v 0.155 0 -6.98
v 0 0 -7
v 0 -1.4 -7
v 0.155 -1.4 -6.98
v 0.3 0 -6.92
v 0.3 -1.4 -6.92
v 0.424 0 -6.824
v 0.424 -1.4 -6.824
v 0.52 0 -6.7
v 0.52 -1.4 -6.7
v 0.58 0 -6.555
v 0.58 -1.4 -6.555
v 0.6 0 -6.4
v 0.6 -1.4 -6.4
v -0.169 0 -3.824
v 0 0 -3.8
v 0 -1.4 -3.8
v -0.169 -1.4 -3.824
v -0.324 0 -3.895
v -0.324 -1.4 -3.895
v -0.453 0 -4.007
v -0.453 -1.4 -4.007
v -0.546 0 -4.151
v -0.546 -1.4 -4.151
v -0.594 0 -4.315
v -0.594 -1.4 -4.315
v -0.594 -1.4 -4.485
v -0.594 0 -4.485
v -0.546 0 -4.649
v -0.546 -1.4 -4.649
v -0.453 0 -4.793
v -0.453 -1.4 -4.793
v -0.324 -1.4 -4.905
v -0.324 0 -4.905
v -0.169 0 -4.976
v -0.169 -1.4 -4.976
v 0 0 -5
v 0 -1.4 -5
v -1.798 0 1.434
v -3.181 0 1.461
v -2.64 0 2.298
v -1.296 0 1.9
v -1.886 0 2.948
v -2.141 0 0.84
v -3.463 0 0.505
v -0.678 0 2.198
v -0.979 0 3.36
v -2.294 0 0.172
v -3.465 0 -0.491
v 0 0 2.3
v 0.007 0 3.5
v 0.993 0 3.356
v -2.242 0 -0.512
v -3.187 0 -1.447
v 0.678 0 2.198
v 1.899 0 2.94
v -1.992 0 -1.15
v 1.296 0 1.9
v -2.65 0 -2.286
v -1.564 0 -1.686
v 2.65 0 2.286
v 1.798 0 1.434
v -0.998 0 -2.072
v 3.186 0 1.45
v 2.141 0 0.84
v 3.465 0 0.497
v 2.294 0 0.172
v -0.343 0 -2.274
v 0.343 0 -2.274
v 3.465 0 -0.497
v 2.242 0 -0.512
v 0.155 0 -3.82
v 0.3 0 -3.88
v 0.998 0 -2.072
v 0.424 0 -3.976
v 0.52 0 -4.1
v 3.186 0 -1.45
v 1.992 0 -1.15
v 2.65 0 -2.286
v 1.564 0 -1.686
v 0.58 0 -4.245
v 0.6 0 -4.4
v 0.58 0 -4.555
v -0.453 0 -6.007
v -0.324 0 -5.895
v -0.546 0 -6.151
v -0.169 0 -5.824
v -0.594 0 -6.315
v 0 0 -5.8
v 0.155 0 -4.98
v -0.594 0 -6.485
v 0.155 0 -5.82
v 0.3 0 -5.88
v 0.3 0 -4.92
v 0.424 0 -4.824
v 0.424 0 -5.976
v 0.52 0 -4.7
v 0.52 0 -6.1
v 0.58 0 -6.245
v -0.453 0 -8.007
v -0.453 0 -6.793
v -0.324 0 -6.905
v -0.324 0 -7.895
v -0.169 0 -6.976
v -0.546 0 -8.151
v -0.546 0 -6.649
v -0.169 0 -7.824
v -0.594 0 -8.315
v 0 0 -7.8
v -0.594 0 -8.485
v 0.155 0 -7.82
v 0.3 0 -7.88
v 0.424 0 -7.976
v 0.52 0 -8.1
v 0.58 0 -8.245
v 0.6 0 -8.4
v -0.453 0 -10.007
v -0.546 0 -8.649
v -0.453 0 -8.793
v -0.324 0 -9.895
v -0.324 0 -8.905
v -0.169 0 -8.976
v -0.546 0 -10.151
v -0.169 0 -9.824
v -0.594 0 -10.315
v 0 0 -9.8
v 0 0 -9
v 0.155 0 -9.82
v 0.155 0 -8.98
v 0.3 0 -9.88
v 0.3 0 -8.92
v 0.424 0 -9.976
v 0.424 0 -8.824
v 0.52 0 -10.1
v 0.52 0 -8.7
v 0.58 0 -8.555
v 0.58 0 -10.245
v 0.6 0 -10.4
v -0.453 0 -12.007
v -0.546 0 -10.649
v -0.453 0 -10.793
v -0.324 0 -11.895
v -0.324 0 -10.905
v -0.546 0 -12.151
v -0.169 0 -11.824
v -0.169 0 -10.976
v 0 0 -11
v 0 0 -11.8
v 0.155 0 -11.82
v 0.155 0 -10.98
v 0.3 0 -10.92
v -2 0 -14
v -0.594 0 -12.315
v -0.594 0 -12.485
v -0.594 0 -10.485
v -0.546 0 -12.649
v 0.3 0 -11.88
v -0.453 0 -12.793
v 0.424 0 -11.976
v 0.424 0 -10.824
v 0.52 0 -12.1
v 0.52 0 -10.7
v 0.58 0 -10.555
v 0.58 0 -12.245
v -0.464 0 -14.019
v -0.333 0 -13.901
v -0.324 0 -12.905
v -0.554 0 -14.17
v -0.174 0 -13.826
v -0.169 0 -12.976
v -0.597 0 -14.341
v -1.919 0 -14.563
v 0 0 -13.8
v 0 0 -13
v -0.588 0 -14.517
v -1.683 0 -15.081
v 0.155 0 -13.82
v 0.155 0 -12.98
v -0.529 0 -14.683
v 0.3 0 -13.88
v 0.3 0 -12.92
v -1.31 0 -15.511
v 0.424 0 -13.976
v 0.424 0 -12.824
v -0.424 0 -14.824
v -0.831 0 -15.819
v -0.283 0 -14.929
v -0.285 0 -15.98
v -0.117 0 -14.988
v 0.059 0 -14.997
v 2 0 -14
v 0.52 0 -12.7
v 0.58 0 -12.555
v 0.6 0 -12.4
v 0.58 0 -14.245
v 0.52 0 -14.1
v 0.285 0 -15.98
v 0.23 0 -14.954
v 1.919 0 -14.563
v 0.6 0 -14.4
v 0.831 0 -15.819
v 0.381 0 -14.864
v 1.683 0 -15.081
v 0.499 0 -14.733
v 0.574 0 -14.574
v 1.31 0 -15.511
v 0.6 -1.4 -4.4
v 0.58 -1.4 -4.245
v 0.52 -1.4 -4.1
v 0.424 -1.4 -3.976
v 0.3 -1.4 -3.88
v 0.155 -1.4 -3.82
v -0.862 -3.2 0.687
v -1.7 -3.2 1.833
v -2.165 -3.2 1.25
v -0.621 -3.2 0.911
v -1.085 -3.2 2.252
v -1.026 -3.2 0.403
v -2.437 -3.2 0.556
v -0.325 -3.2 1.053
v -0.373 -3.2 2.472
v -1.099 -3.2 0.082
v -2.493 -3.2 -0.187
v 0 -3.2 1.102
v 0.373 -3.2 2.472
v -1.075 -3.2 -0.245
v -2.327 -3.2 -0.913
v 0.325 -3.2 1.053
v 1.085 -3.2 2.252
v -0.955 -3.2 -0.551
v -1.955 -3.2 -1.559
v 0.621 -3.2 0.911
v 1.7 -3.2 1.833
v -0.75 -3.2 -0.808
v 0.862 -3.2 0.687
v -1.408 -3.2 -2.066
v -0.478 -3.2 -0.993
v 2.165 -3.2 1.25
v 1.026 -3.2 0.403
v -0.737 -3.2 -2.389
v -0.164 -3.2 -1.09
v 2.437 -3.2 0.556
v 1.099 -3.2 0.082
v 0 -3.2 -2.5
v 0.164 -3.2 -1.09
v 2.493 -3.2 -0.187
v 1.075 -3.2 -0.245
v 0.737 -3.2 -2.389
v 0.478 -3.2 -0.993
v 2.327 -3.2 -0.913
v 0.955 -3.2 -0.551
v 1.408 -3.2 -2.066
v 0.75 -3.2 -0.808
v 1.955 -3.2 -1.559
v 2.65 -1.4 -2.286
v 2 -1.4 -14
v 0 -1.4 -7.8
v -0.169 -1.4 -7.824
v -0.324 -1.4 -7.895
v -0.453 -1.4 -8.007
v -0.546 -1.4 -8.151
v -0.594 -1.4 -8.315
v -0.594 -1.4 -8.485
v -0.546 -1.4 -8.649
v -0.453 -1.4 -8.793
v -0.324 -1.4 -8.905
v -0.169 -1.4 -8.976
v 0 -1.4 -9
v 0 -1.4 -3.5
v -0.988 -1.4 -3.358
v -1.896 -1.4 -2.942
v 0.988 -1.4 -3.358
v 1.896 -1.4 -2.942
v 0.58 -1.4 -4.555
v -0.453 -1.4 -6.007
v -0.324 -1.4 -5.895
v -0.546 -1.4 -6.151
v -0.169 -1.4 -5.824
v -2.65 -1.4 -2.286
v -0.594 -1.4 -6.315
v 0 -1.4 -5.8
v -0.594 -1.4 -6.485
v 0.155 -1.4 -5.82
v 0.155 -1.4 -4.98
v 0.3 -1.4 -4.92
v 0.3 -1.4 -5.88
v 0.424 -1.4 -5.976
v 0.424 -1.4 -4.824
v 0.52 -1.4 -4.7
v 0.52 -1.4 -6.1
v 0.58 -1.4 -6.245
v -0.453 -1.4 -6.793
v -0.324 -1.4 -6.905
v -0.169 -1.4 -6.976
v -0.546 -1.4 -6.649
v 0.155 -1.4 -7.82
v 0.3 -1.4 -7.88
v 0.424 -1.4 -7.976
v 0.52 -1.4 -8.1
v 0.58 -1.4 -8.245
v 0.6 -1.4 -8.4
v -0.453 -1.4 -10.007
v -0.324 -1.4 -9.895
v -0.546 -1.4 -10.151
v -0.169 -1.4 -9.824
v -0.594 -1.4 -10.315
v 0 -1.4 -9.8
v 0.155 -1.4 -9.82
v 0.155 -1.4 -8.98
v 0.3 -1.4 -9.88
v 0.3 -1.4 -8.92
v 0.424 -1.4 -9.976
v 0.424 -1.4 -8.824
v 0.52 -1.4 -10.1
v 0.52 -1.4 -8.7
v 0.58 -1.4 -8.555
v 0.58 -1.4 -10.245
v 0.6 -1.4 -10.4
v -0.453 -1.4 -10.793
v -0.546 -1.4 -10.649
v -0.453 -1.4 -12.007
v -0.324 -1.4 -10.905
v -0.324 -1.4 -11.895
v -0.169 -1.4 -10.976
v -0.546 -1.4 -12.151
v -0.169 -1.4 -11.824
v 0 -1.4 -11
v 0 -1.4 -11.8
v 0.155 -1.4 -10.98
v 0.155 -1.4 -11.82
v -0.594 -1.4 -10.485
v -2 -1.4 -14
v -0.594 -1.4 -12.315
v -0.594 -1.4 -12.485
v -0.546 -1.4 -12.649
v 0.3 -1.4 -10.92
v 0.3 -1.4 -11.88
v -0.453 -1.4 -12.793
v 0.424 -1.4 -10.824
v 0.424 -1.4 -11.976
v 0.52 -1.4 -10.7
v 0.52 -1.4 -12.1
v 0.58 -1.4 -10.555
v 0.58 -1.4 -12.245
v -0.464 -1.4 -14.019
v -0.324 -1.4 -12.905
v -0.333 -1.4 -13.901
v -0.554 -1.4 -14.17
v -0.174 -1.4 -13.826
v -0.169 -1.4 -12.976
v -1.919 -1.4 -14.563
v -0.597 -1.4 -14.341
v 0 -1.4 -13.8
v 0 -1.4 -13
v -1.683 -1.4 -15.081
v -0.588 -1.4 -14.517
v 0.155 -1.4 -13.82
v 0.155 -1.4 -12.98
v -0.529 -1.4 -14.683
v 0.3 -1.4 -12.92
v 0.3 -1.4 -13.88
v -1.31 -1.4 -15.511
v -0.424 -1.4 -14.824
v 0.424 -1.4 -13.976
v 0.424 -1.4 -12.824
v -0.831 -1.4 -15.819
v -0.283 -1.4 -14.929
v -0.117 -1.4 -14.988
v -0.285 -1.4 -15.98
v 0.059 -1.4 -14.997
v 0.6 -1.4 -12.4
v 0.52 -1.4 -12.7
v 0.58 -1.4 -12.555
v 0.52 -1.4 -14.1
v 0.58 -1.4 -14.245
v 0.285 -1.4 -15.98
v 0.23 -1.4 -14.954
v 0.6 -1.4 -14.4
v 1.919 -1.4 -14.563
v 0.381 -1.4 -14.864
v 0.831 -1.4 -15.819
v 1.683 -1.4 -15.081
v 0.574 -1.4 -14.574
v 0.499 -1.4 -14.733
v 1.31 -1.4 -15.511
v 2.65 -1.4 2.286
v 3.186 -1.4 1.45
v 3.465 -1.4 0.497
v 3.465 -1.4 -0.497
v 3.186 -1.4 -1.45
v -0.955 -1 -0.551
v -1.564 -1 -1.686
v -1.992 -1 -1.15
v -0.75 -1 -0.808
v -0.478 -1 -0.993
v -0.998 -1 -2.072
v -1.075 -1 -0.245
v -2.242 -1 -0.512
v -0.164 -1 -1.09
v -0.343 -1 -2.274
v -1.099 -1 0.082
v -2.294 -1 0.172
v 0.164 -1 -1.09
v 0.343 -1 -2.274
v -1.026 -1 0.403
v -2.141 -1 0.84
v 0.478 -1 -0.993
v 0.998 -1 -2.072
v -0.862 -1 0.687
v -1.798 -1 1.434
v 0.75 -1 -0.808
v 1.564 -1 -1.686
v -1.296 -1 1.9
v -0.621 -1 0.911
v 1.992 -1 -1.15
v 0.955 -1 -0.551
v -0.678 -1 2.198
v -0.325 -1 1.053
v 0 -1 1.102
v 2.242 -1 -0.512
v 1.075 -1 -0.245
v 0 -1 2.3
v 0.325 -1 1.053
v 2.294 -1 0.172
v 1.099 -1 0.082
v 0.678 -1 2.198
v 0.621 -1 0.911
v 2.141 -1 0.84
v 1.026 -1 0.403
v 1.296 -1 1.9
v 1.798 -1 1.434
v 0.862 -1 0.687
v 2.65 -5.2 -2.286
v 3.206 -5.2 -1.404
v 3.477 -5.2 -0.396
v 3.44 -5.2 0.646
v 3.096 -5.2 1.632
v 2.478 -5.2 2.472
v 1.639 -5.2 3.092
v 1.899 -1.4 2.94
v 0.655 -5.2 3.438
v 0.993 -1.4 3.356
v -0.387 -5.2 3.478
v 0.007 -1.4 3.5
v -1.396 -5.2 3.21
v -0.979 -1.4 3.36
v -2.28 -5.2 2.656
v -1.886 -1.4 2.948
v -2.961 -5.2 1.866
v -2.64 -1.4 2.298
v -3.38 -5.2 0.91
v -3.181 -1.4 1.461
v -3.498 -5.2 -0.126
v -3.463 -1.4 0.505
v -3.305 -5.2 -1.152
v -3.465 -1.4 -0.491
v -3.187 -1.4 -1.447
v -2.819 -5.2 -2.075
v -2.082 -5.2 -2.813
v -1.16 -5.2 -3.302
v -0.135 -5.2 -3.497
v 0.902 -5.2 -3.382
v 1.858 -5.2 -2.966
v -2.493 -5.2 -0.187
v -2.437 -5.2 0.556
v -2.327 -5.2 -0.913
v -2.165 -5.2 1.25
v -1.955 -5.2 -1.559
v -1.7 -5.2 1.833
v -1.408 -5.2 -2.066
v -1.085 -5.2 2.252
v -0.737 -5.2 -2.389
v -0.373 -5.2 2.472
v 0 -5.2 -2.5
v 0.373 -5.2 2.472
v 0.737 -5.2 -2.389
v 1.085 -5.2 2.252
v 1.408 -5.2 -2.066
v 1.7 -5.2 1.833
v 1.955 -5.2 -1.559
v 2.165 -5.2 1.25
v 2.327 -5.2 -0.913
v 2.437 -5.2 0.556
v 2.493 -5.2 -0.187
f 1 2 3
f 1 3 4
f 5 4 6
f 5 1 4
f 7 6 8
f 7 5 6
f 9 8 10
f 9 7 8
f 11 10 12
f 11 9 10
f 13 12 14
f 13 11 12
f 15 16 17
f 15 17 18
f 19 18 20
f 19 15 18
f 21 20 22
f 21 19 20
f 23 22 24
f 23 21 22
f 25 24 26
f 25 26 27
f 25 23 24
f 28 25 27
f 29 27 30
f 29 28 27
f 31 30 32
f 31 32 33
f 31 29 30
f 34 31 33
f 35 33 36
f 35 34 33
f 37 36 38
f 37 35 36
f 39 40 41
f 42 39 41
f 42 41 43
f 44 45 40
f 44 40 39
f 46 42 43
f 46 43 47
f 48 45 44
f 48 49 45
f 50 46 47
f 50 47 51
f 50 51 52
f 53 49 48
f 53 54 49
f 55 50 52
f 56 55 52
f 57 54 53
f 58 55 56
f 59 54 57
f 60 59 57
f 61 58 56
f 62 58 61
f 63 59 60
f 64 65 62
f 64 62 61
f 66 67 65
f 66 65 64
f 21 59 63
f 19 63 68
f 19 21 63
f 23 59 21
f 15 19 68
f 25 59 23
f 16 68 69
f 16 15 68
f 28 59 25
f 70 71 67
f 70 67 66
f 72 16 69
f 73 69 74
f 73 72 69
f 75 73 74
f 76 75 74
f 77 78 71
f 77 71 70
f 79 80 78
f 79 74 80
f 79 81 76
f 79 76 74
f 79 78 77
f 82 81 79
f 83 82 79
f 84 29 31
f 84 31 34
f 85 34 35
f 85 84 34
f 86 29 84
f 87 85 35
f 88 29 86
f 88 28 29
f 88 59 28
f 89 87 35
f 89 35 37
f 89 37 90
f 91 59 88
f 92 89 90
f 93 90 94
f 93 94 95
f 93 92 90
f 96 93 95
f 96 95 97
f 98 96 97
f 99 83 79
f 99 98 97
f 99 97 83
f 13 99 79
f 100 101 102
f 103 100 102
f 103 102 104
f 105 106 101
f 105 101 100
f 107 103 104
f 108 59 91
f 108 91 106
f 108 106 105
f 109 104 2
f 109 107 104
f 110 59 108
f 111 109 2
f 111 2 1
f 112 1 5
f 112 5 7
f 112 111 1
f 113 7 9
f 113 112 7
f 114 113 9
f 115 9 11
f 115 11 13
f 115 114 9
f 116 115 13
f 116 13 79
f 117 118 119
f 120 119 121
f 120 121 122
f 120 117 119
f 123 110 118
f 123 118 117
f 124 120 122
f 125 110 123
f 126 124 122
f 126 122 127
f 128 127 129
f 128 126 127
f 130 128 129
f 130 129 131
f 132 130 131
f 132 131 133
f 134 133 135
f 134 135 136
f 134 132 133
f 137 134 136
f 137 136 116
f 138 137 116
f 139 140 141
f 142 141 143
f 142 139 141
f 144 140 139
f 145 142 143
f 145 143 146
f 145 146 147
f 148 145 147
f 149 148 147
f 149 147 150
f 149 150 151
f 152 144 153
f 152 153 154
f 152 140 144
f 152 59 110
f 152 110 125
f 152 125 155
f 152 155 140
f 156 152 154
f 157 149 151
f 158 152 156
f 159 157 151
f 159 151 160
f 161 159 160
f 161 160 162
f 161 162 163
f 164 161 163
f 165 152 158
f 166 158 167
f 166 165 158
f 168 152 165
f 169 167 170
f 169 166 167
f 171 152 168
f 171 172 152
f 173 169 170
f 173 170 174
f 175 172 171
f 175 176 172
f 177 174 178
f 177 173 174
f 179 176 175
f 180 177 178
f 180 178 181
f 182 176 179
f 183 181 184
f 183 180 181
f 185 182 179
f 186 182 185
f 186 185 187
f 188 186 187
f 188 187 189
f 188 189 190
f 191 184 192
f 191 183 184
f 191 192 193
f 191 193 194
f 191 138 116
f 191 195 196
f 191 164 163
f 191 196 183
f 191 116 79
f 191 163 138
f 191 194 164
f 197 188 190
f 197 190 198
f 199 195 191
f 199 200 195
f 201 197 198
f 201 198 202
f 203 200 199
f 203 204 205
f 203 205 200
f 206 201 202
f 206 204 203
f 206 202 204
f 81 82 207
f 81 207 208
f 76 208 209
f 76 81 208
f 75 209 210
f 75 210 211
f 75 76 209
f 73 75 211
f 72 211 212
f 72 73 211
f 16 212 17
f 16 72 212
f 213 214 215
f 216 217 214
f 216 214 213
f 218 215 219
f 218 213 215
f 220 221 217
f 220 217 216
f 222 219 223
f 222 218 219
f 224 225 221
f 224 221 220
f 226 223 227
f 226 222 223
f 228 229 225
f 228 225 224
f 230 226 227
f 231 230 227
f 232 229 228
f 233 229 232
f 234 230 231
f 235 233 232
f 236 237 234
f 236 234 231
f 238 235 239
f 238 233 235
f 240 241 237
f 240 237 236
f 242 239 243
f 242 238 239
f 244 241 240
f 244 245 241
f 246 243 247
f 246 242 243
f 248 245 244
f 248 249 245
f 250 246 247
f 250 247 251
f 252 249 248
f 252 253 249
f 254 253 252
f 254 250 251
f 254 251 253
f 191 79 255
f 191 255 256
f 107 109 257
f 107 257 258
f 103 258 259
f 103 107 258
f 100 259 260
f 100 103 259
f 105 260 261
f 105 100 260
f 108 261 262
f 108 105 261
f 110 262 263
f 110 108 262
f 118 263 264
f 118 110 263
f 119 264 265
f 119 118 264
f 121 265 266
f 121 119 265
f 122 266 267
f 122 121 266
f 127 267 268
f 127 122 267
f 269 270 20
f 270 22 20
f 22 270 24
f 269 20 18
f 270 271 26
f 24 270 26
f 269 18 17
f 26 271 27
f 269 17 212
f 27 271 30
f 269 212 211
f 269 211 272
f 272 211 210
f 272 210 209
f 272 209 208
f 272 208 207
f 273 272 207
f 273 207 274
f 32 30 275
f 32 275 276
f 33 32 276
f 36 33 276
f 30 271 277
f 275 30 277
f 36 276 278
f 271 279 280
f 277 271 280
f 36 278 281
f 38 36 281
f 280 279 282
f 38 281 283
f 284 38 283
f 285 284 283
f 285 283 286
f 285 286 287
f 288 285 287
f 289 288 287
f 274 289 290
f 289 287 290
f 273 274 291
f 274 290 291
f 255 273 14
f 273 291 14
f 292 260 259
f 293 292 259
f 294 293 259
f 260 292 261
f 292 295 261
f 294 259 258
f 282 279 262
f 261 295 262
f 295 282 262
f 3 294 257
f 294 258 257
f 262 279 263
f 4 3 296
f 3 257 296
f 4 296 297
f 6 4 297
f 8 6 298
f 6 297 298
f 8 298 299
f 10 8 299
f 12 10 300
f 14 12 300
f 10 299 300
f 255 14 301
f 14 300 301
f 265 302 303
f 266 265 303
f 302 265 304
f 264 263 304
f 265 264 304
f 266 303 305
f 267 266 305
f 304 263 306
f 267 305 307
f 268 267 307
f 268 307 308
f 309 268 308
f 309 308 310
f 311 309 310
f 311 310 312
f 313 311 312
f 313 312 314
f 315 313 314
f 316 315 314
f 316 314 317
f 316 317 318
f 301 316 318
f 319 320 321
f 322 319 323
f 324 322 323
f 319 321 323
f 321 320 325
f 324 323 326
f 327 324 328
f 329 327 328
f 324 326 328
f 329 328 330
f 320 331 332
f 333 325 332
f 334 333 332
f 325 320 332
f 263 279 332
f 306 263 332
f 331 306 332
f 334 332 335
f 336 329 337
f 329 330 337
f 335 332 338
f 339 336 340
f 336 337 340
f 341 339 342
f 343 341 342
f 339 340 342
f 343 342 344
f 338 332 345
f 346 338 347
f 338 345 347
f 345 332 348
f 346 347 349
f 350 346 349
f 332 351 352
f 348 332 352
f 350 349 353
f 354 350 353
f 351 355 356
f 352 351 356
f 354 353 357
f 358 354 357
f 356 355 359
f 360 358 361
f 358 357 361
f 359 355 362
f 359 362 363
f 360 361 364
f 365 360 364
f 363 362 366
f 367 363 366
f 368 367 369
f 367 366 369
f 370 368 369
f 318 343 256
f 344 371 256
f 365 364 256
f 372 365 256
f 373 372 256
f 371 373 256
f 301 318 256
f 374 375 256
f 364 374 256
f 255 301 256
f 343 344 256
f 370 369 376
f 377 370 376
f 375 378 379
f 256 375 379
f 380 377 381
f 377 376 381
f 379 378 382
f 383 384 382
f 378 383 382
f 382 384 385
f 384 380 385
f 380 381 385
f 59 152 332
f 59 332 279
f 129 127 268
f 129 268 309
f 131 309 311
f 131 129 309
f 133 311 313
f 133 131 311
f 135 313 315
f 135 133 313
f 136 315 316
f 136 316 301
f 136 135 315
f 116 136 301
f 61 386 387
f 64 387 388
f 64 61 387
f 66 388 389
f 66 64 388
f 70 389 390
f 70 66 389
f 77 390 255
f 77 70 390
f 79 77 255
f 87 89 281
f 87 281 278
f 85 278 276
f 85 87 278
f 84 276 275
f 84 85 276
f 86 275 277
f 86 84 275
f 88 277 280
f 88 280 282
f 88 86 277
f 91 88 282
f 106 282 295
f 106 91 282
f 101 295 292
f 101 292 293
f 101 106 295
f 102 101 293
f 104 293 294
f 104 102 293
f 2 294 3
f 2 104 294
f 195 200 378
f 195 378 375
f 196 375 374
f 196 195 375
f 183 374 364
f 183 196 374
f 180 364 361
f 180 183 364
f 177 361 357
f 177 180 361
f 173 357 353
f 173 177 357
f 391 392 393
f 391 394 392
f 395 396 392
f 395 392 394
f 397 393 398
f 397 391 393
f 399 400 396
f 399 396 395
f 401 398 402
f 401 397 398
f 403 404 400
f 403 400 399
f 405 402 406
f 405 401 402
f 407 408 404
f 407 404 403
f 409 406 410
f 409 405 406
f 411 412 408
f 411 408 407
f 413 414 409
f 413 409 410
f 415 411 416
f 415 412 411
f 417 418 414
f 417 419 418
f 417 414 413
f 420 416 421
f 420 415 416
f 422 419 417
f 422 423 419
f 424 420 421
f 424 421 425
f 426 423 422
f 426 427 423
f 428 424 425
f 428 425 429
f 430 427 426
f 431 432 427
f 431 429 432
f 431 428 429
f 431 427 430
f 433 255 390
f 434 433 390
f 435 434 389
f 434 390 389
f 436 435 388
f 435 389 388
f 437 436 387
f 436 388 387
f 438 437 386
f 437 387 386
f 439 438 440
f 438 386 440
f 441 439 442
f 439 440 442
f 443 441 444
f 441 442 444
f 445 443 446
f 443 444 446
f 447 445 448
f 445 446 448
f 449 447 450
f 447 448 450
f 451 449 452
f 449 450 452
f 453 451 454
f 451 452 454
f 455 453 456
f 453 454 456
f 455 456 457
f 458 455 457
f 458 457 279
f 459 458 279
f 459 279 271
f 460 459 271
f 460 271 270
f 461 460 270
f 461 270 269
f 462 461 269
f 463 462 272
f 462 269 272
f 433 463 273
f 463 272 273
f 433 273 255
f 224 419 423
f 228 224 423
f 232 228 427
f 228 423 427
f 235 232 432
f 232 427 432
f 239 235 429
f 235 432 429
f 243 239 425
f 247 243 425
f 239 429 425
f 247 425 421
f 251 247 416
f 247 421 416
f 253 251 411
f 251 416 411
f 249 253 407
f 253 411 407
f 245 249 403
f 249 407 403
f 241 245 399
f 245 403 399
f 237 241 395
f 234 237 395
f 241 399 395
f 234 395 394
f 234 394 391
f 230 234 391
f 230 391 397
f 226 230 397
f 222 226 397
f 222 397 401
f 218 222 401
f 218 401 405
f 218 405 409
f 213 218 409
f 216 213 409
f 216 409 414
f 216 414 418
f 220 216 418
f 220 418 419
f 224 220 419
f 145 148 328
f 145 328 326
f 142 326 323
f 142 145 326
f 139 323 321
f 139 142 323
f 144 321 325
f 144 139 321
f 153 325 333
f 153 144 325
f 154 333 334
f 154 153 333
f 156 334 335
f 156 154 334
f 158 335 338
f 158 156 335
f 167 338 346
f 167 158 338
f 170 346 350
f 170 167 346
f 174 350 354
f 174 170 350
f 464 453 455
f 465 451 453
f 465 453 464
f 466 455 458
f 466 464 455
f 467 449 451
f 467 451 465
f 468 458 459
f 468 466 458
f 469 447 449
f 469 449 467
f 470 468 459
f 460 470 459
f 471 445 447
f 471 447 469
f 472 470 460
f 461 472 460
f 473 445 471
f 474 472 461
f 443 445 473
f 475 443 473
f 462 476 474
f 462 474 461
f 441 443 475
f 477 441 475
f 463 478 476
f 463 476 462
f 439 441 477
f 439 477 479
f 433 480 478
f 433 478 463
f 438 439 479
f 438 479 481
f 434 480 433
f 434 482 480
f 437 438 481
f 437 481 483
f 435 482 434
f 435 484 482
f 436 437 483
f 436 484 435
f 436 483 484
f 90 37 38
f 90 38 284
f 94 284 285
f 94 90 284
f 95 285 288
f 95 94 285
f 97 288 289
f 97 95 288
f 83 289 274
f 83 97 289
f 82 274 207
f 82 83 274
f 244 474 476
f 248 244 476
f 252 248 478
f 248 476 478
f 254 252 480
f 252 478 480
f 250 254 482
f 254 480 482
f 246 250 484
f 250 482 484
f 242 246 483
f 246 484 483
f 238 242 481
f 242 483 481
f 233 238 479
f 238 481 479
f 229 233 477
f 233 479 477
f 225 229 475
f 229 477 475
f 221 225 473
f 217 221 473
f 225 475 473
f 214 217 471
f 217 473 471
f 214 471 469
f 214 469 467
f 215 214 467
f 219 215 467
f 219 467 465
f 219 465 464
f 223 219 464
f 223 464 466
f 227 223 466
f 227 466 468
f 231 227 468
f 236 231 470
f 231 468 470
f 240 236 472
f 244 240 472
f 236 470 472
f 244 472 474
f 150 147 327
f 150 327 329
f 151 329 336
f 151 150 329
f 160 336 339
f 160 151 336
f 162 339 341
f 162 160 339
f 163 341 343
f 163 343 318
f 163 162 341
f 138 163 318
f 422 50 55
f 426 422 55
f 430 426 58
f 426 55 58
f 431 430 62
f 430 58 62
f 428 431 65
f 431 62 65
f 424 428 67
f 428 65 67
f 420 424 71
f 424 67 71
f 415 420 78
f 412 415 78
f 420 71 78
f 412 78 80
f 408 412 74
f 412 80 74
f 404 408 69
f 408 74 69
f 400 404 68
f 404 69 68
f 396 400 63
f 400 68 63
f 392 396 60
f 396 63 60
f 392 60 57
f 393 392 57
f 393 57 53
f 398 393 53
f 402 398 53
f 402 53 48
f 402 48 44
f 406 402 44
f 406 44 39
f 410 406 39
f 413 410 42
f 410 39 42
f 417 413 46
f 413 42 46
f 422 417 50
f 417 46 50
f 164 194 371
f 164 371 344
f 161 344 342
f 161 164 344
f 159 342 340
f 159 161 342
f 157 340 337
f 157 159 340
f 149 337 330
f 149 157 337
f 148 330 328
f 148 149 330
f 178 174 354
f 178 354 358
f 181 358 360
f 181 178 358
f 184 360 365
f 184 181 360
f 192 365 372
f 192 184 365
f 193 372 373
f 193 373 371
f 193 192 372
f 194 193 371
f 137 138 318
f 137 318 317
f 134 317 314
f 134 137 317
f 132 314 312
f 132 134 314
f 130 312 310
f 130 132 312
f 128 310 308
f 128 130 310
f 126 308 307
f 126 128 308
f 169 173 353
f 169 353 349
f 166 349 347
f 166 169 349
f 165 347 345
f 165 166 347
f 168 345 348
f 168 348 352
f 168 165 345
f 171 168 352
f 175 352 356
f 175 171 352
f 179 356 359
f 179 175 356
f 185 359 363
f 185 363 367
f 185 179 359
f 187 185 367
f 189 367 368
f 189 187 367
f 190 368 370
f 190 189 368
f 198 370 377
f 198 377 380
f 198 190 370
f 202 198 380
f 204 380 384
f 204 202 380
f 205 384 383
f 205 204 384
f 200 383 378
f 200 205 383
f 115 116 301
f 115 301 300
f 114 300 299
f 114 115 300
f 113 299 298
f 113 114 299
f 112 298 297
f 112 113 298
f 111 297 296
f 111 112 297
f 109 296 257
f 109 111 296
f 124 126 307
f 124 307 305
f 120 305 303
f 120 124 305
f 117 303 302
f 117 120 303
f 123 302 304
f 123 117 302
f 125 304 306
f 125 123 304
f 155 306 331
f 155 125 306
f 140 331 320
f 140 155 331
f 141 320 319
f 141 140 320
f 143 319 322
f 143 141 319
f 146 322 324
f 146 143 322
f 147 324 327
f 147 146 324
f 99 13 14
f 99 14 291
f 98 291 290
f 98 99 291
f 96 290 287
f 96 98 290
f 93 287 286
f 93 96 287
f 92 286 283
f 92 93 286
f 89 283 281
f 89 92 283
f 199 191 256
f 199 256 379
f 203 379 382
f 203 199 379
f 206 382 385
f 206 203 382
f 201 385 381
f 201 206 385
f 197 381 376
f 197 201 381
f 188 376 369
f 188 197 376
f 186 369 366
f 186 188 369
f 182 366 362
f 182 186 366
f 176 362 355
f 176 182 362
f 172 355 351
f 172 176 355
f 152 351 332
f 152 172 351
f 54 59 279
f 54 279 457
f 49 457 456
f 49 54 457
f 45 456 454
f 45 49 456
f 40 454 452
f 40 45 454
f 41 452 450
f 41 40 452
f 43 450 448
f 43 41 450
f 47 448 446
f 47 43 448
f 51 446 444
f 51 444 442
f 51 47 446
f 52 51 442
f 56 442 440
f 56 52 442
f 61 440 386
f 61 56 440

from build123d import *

# Parameters (mm, degrees)
BOSS_EXTRUDE1_DEPTH = 1.4
SKETCH2_R           = 3.5
BOSS_EXTRUDE2_DEPTH = 3.8
SKETCH3_R           = 2.3
CUT_EXTRUDE1_DEPTH  = 1
SKETCH4_R           = 2.5
CUT_EXTRUDE2_DEPTH  = 2
CUT_EXTRUDE3_REACH  = 18.908
SKETCH5_R           = 1.102182


with BuildPart() as part:
    # Sketch1 → Boss-Extrude1 (new body)
    with BuildSketch(Plane(origin=(0, 0, 0), x_dir=(1, 0, 0), z_dir=(0, 1, 0))):
        with BuildLine():
            ThreePointArc((2, 14), (0, 16), (-2, 14))
            Line((-2, 14), (-2.65, 2.286373))
            ThreePointArc((-2.65, 2.286373), (-2.286373, -2.65), (2.65, -2.286373))
            ThreePointArc((2.65, -2.286373), (3.5, 0), (2.65, 2.286373))
            Line((2.65, 2.286373), (2, 14))
        make_face()
        with BuildLine():
            ThreePointArc((0, 3.8), (-0.6, 4.4), (0, 5))
            ThreePointArc((0, 5), (0.424264, 4.824264), (0.6, 4.4))
            ThreePointArc((0.6, 4.4), (0.424264, 3.975736), (0, 3.8))
        make_face(mode=Mode.SUBTRACT)
        with BuildLine():
            ThreePointArc((0, 5.8), (-0.6, 6.4), (0, 7))
            ThreePointArc((0, 7), (0.424264, 6.824264), (0.6, 6.4))
            ThreePointArc((0.6, 6.4), (0.424264, 5.975736), (0, 5.8))
        make_face(mode=Mode.SUBTRACT)
        with BuildLine():
            ThreePointArc((0, 7.8), (-0.6, 8.4), (0, 9))
            ThreePointArc((0, 9), (0.424264, 8.824264), (0.6, 8.4))
            ThreePointArc((0.6, 8.4), (0.424264, 7.975736), (0, 7.8))
        make_face(mode=Mode.SUBTRACT)
        with BuildLine():
            ThreePointArc((0, 9.8), (-0.6, 10.4), (0, 11))
            ThreePointArc((0, 11), (0.424264, 10.824264), (0.6, 10.4))
            ThreePointArc((0.6, 10.4), (0.424264, 9.975736), (0, 9.8))
        make_face(mode=Mode.SUBTRACT)
        with BuildLine():
            ThreePointArc((0, 11.8), (-0.6, 12.4), (0, 13))
            ThreePointArc((0, 13), (0.424264, 12.824264), (0.6, 12.4))
            ThreePointArc((0.6, 12.4), (0.424264, 11.975736), (0, 11.8))
        make_face(mode=Mode.SUBTRACT)
        with BuildLine():
            ThreePointArc((0.6, 14.4), (0.424264, 13.975736), (0, 13.8))
            ThreePointArc((0, 13.8), (-0.424264, 14.824264), (0.6, 14.4))
        make_face(mode=Mode.SUBTRACT)
    extrude(amount=-BOSS_EXTRUDE1_DEPTH)

    # Sketch2 → Boss-Extrude2 (add)
    with BuildSketch(Plane(origin=(0, -1.4, 0), x_dir=(-1, 0, 0), z_dir=(0, -1, 0))):
        with Locations(Location((0, 0, 0), (0, 0, 139.212962))):
            Circle(SKETCH2_R)
    extrude(amount=BOSS_EXTRUDE2_DEPTH)

    # Sketch3 → Cut-Extrude1 (cut)
    with BuildSketch(Plane(origin=(0, 0, 0), x_dir=(1, 0, 0), z_dir=(0, 1, 0))):
        with Locations(Location((0, 0, 0), (0, 0, 270))):
            Circle(SKETCH3_R)
    extrude(amount=-CUT_EXTRUDE1_DEPTH, mode=Mode.SUBTRACT)

    # Sketch4 → Cut-Extrude2 (cut)
    with BuildSketch(Plane(origin=(0, -5.2, 0), x_dir=(-1, 0, 0), z_dir=(0, -1, 0))):
        with Locations(Location((0, 0, 0), (0, 0, 90))):
            Circle(SKETCH4_R)
    extrude(amount=-CUT_EXTRUDE2_DEPTH, mode=Mode.SUBTRACT)

    # Sketch5 → Cut-Extrude3 (cut, up to next)
    with BuildSketch(Plane(origin=(0, -1, 0), x_dir=(1, 0, 0), z_dir=(0, 1, 0)), mode=Mode.PRIVATE) as cut_extrude3_sk1:
        with Locations(Location((0, 0, 0), (0, 0, 270))):
            Circle(SKETCH5_R)
    cut_extrude3_tool1 = extrude(cut_extrude3_sk1.sketch, amount=-CUT_EXTRUDE3_REACH, mode=Mode.PRIVATE) & part.part
    add(cut_extrude3_tool1.solids().sort_by_distance((0, -1, 0))[0], mode=Mode.SUBTRACT)


solid = part.part
